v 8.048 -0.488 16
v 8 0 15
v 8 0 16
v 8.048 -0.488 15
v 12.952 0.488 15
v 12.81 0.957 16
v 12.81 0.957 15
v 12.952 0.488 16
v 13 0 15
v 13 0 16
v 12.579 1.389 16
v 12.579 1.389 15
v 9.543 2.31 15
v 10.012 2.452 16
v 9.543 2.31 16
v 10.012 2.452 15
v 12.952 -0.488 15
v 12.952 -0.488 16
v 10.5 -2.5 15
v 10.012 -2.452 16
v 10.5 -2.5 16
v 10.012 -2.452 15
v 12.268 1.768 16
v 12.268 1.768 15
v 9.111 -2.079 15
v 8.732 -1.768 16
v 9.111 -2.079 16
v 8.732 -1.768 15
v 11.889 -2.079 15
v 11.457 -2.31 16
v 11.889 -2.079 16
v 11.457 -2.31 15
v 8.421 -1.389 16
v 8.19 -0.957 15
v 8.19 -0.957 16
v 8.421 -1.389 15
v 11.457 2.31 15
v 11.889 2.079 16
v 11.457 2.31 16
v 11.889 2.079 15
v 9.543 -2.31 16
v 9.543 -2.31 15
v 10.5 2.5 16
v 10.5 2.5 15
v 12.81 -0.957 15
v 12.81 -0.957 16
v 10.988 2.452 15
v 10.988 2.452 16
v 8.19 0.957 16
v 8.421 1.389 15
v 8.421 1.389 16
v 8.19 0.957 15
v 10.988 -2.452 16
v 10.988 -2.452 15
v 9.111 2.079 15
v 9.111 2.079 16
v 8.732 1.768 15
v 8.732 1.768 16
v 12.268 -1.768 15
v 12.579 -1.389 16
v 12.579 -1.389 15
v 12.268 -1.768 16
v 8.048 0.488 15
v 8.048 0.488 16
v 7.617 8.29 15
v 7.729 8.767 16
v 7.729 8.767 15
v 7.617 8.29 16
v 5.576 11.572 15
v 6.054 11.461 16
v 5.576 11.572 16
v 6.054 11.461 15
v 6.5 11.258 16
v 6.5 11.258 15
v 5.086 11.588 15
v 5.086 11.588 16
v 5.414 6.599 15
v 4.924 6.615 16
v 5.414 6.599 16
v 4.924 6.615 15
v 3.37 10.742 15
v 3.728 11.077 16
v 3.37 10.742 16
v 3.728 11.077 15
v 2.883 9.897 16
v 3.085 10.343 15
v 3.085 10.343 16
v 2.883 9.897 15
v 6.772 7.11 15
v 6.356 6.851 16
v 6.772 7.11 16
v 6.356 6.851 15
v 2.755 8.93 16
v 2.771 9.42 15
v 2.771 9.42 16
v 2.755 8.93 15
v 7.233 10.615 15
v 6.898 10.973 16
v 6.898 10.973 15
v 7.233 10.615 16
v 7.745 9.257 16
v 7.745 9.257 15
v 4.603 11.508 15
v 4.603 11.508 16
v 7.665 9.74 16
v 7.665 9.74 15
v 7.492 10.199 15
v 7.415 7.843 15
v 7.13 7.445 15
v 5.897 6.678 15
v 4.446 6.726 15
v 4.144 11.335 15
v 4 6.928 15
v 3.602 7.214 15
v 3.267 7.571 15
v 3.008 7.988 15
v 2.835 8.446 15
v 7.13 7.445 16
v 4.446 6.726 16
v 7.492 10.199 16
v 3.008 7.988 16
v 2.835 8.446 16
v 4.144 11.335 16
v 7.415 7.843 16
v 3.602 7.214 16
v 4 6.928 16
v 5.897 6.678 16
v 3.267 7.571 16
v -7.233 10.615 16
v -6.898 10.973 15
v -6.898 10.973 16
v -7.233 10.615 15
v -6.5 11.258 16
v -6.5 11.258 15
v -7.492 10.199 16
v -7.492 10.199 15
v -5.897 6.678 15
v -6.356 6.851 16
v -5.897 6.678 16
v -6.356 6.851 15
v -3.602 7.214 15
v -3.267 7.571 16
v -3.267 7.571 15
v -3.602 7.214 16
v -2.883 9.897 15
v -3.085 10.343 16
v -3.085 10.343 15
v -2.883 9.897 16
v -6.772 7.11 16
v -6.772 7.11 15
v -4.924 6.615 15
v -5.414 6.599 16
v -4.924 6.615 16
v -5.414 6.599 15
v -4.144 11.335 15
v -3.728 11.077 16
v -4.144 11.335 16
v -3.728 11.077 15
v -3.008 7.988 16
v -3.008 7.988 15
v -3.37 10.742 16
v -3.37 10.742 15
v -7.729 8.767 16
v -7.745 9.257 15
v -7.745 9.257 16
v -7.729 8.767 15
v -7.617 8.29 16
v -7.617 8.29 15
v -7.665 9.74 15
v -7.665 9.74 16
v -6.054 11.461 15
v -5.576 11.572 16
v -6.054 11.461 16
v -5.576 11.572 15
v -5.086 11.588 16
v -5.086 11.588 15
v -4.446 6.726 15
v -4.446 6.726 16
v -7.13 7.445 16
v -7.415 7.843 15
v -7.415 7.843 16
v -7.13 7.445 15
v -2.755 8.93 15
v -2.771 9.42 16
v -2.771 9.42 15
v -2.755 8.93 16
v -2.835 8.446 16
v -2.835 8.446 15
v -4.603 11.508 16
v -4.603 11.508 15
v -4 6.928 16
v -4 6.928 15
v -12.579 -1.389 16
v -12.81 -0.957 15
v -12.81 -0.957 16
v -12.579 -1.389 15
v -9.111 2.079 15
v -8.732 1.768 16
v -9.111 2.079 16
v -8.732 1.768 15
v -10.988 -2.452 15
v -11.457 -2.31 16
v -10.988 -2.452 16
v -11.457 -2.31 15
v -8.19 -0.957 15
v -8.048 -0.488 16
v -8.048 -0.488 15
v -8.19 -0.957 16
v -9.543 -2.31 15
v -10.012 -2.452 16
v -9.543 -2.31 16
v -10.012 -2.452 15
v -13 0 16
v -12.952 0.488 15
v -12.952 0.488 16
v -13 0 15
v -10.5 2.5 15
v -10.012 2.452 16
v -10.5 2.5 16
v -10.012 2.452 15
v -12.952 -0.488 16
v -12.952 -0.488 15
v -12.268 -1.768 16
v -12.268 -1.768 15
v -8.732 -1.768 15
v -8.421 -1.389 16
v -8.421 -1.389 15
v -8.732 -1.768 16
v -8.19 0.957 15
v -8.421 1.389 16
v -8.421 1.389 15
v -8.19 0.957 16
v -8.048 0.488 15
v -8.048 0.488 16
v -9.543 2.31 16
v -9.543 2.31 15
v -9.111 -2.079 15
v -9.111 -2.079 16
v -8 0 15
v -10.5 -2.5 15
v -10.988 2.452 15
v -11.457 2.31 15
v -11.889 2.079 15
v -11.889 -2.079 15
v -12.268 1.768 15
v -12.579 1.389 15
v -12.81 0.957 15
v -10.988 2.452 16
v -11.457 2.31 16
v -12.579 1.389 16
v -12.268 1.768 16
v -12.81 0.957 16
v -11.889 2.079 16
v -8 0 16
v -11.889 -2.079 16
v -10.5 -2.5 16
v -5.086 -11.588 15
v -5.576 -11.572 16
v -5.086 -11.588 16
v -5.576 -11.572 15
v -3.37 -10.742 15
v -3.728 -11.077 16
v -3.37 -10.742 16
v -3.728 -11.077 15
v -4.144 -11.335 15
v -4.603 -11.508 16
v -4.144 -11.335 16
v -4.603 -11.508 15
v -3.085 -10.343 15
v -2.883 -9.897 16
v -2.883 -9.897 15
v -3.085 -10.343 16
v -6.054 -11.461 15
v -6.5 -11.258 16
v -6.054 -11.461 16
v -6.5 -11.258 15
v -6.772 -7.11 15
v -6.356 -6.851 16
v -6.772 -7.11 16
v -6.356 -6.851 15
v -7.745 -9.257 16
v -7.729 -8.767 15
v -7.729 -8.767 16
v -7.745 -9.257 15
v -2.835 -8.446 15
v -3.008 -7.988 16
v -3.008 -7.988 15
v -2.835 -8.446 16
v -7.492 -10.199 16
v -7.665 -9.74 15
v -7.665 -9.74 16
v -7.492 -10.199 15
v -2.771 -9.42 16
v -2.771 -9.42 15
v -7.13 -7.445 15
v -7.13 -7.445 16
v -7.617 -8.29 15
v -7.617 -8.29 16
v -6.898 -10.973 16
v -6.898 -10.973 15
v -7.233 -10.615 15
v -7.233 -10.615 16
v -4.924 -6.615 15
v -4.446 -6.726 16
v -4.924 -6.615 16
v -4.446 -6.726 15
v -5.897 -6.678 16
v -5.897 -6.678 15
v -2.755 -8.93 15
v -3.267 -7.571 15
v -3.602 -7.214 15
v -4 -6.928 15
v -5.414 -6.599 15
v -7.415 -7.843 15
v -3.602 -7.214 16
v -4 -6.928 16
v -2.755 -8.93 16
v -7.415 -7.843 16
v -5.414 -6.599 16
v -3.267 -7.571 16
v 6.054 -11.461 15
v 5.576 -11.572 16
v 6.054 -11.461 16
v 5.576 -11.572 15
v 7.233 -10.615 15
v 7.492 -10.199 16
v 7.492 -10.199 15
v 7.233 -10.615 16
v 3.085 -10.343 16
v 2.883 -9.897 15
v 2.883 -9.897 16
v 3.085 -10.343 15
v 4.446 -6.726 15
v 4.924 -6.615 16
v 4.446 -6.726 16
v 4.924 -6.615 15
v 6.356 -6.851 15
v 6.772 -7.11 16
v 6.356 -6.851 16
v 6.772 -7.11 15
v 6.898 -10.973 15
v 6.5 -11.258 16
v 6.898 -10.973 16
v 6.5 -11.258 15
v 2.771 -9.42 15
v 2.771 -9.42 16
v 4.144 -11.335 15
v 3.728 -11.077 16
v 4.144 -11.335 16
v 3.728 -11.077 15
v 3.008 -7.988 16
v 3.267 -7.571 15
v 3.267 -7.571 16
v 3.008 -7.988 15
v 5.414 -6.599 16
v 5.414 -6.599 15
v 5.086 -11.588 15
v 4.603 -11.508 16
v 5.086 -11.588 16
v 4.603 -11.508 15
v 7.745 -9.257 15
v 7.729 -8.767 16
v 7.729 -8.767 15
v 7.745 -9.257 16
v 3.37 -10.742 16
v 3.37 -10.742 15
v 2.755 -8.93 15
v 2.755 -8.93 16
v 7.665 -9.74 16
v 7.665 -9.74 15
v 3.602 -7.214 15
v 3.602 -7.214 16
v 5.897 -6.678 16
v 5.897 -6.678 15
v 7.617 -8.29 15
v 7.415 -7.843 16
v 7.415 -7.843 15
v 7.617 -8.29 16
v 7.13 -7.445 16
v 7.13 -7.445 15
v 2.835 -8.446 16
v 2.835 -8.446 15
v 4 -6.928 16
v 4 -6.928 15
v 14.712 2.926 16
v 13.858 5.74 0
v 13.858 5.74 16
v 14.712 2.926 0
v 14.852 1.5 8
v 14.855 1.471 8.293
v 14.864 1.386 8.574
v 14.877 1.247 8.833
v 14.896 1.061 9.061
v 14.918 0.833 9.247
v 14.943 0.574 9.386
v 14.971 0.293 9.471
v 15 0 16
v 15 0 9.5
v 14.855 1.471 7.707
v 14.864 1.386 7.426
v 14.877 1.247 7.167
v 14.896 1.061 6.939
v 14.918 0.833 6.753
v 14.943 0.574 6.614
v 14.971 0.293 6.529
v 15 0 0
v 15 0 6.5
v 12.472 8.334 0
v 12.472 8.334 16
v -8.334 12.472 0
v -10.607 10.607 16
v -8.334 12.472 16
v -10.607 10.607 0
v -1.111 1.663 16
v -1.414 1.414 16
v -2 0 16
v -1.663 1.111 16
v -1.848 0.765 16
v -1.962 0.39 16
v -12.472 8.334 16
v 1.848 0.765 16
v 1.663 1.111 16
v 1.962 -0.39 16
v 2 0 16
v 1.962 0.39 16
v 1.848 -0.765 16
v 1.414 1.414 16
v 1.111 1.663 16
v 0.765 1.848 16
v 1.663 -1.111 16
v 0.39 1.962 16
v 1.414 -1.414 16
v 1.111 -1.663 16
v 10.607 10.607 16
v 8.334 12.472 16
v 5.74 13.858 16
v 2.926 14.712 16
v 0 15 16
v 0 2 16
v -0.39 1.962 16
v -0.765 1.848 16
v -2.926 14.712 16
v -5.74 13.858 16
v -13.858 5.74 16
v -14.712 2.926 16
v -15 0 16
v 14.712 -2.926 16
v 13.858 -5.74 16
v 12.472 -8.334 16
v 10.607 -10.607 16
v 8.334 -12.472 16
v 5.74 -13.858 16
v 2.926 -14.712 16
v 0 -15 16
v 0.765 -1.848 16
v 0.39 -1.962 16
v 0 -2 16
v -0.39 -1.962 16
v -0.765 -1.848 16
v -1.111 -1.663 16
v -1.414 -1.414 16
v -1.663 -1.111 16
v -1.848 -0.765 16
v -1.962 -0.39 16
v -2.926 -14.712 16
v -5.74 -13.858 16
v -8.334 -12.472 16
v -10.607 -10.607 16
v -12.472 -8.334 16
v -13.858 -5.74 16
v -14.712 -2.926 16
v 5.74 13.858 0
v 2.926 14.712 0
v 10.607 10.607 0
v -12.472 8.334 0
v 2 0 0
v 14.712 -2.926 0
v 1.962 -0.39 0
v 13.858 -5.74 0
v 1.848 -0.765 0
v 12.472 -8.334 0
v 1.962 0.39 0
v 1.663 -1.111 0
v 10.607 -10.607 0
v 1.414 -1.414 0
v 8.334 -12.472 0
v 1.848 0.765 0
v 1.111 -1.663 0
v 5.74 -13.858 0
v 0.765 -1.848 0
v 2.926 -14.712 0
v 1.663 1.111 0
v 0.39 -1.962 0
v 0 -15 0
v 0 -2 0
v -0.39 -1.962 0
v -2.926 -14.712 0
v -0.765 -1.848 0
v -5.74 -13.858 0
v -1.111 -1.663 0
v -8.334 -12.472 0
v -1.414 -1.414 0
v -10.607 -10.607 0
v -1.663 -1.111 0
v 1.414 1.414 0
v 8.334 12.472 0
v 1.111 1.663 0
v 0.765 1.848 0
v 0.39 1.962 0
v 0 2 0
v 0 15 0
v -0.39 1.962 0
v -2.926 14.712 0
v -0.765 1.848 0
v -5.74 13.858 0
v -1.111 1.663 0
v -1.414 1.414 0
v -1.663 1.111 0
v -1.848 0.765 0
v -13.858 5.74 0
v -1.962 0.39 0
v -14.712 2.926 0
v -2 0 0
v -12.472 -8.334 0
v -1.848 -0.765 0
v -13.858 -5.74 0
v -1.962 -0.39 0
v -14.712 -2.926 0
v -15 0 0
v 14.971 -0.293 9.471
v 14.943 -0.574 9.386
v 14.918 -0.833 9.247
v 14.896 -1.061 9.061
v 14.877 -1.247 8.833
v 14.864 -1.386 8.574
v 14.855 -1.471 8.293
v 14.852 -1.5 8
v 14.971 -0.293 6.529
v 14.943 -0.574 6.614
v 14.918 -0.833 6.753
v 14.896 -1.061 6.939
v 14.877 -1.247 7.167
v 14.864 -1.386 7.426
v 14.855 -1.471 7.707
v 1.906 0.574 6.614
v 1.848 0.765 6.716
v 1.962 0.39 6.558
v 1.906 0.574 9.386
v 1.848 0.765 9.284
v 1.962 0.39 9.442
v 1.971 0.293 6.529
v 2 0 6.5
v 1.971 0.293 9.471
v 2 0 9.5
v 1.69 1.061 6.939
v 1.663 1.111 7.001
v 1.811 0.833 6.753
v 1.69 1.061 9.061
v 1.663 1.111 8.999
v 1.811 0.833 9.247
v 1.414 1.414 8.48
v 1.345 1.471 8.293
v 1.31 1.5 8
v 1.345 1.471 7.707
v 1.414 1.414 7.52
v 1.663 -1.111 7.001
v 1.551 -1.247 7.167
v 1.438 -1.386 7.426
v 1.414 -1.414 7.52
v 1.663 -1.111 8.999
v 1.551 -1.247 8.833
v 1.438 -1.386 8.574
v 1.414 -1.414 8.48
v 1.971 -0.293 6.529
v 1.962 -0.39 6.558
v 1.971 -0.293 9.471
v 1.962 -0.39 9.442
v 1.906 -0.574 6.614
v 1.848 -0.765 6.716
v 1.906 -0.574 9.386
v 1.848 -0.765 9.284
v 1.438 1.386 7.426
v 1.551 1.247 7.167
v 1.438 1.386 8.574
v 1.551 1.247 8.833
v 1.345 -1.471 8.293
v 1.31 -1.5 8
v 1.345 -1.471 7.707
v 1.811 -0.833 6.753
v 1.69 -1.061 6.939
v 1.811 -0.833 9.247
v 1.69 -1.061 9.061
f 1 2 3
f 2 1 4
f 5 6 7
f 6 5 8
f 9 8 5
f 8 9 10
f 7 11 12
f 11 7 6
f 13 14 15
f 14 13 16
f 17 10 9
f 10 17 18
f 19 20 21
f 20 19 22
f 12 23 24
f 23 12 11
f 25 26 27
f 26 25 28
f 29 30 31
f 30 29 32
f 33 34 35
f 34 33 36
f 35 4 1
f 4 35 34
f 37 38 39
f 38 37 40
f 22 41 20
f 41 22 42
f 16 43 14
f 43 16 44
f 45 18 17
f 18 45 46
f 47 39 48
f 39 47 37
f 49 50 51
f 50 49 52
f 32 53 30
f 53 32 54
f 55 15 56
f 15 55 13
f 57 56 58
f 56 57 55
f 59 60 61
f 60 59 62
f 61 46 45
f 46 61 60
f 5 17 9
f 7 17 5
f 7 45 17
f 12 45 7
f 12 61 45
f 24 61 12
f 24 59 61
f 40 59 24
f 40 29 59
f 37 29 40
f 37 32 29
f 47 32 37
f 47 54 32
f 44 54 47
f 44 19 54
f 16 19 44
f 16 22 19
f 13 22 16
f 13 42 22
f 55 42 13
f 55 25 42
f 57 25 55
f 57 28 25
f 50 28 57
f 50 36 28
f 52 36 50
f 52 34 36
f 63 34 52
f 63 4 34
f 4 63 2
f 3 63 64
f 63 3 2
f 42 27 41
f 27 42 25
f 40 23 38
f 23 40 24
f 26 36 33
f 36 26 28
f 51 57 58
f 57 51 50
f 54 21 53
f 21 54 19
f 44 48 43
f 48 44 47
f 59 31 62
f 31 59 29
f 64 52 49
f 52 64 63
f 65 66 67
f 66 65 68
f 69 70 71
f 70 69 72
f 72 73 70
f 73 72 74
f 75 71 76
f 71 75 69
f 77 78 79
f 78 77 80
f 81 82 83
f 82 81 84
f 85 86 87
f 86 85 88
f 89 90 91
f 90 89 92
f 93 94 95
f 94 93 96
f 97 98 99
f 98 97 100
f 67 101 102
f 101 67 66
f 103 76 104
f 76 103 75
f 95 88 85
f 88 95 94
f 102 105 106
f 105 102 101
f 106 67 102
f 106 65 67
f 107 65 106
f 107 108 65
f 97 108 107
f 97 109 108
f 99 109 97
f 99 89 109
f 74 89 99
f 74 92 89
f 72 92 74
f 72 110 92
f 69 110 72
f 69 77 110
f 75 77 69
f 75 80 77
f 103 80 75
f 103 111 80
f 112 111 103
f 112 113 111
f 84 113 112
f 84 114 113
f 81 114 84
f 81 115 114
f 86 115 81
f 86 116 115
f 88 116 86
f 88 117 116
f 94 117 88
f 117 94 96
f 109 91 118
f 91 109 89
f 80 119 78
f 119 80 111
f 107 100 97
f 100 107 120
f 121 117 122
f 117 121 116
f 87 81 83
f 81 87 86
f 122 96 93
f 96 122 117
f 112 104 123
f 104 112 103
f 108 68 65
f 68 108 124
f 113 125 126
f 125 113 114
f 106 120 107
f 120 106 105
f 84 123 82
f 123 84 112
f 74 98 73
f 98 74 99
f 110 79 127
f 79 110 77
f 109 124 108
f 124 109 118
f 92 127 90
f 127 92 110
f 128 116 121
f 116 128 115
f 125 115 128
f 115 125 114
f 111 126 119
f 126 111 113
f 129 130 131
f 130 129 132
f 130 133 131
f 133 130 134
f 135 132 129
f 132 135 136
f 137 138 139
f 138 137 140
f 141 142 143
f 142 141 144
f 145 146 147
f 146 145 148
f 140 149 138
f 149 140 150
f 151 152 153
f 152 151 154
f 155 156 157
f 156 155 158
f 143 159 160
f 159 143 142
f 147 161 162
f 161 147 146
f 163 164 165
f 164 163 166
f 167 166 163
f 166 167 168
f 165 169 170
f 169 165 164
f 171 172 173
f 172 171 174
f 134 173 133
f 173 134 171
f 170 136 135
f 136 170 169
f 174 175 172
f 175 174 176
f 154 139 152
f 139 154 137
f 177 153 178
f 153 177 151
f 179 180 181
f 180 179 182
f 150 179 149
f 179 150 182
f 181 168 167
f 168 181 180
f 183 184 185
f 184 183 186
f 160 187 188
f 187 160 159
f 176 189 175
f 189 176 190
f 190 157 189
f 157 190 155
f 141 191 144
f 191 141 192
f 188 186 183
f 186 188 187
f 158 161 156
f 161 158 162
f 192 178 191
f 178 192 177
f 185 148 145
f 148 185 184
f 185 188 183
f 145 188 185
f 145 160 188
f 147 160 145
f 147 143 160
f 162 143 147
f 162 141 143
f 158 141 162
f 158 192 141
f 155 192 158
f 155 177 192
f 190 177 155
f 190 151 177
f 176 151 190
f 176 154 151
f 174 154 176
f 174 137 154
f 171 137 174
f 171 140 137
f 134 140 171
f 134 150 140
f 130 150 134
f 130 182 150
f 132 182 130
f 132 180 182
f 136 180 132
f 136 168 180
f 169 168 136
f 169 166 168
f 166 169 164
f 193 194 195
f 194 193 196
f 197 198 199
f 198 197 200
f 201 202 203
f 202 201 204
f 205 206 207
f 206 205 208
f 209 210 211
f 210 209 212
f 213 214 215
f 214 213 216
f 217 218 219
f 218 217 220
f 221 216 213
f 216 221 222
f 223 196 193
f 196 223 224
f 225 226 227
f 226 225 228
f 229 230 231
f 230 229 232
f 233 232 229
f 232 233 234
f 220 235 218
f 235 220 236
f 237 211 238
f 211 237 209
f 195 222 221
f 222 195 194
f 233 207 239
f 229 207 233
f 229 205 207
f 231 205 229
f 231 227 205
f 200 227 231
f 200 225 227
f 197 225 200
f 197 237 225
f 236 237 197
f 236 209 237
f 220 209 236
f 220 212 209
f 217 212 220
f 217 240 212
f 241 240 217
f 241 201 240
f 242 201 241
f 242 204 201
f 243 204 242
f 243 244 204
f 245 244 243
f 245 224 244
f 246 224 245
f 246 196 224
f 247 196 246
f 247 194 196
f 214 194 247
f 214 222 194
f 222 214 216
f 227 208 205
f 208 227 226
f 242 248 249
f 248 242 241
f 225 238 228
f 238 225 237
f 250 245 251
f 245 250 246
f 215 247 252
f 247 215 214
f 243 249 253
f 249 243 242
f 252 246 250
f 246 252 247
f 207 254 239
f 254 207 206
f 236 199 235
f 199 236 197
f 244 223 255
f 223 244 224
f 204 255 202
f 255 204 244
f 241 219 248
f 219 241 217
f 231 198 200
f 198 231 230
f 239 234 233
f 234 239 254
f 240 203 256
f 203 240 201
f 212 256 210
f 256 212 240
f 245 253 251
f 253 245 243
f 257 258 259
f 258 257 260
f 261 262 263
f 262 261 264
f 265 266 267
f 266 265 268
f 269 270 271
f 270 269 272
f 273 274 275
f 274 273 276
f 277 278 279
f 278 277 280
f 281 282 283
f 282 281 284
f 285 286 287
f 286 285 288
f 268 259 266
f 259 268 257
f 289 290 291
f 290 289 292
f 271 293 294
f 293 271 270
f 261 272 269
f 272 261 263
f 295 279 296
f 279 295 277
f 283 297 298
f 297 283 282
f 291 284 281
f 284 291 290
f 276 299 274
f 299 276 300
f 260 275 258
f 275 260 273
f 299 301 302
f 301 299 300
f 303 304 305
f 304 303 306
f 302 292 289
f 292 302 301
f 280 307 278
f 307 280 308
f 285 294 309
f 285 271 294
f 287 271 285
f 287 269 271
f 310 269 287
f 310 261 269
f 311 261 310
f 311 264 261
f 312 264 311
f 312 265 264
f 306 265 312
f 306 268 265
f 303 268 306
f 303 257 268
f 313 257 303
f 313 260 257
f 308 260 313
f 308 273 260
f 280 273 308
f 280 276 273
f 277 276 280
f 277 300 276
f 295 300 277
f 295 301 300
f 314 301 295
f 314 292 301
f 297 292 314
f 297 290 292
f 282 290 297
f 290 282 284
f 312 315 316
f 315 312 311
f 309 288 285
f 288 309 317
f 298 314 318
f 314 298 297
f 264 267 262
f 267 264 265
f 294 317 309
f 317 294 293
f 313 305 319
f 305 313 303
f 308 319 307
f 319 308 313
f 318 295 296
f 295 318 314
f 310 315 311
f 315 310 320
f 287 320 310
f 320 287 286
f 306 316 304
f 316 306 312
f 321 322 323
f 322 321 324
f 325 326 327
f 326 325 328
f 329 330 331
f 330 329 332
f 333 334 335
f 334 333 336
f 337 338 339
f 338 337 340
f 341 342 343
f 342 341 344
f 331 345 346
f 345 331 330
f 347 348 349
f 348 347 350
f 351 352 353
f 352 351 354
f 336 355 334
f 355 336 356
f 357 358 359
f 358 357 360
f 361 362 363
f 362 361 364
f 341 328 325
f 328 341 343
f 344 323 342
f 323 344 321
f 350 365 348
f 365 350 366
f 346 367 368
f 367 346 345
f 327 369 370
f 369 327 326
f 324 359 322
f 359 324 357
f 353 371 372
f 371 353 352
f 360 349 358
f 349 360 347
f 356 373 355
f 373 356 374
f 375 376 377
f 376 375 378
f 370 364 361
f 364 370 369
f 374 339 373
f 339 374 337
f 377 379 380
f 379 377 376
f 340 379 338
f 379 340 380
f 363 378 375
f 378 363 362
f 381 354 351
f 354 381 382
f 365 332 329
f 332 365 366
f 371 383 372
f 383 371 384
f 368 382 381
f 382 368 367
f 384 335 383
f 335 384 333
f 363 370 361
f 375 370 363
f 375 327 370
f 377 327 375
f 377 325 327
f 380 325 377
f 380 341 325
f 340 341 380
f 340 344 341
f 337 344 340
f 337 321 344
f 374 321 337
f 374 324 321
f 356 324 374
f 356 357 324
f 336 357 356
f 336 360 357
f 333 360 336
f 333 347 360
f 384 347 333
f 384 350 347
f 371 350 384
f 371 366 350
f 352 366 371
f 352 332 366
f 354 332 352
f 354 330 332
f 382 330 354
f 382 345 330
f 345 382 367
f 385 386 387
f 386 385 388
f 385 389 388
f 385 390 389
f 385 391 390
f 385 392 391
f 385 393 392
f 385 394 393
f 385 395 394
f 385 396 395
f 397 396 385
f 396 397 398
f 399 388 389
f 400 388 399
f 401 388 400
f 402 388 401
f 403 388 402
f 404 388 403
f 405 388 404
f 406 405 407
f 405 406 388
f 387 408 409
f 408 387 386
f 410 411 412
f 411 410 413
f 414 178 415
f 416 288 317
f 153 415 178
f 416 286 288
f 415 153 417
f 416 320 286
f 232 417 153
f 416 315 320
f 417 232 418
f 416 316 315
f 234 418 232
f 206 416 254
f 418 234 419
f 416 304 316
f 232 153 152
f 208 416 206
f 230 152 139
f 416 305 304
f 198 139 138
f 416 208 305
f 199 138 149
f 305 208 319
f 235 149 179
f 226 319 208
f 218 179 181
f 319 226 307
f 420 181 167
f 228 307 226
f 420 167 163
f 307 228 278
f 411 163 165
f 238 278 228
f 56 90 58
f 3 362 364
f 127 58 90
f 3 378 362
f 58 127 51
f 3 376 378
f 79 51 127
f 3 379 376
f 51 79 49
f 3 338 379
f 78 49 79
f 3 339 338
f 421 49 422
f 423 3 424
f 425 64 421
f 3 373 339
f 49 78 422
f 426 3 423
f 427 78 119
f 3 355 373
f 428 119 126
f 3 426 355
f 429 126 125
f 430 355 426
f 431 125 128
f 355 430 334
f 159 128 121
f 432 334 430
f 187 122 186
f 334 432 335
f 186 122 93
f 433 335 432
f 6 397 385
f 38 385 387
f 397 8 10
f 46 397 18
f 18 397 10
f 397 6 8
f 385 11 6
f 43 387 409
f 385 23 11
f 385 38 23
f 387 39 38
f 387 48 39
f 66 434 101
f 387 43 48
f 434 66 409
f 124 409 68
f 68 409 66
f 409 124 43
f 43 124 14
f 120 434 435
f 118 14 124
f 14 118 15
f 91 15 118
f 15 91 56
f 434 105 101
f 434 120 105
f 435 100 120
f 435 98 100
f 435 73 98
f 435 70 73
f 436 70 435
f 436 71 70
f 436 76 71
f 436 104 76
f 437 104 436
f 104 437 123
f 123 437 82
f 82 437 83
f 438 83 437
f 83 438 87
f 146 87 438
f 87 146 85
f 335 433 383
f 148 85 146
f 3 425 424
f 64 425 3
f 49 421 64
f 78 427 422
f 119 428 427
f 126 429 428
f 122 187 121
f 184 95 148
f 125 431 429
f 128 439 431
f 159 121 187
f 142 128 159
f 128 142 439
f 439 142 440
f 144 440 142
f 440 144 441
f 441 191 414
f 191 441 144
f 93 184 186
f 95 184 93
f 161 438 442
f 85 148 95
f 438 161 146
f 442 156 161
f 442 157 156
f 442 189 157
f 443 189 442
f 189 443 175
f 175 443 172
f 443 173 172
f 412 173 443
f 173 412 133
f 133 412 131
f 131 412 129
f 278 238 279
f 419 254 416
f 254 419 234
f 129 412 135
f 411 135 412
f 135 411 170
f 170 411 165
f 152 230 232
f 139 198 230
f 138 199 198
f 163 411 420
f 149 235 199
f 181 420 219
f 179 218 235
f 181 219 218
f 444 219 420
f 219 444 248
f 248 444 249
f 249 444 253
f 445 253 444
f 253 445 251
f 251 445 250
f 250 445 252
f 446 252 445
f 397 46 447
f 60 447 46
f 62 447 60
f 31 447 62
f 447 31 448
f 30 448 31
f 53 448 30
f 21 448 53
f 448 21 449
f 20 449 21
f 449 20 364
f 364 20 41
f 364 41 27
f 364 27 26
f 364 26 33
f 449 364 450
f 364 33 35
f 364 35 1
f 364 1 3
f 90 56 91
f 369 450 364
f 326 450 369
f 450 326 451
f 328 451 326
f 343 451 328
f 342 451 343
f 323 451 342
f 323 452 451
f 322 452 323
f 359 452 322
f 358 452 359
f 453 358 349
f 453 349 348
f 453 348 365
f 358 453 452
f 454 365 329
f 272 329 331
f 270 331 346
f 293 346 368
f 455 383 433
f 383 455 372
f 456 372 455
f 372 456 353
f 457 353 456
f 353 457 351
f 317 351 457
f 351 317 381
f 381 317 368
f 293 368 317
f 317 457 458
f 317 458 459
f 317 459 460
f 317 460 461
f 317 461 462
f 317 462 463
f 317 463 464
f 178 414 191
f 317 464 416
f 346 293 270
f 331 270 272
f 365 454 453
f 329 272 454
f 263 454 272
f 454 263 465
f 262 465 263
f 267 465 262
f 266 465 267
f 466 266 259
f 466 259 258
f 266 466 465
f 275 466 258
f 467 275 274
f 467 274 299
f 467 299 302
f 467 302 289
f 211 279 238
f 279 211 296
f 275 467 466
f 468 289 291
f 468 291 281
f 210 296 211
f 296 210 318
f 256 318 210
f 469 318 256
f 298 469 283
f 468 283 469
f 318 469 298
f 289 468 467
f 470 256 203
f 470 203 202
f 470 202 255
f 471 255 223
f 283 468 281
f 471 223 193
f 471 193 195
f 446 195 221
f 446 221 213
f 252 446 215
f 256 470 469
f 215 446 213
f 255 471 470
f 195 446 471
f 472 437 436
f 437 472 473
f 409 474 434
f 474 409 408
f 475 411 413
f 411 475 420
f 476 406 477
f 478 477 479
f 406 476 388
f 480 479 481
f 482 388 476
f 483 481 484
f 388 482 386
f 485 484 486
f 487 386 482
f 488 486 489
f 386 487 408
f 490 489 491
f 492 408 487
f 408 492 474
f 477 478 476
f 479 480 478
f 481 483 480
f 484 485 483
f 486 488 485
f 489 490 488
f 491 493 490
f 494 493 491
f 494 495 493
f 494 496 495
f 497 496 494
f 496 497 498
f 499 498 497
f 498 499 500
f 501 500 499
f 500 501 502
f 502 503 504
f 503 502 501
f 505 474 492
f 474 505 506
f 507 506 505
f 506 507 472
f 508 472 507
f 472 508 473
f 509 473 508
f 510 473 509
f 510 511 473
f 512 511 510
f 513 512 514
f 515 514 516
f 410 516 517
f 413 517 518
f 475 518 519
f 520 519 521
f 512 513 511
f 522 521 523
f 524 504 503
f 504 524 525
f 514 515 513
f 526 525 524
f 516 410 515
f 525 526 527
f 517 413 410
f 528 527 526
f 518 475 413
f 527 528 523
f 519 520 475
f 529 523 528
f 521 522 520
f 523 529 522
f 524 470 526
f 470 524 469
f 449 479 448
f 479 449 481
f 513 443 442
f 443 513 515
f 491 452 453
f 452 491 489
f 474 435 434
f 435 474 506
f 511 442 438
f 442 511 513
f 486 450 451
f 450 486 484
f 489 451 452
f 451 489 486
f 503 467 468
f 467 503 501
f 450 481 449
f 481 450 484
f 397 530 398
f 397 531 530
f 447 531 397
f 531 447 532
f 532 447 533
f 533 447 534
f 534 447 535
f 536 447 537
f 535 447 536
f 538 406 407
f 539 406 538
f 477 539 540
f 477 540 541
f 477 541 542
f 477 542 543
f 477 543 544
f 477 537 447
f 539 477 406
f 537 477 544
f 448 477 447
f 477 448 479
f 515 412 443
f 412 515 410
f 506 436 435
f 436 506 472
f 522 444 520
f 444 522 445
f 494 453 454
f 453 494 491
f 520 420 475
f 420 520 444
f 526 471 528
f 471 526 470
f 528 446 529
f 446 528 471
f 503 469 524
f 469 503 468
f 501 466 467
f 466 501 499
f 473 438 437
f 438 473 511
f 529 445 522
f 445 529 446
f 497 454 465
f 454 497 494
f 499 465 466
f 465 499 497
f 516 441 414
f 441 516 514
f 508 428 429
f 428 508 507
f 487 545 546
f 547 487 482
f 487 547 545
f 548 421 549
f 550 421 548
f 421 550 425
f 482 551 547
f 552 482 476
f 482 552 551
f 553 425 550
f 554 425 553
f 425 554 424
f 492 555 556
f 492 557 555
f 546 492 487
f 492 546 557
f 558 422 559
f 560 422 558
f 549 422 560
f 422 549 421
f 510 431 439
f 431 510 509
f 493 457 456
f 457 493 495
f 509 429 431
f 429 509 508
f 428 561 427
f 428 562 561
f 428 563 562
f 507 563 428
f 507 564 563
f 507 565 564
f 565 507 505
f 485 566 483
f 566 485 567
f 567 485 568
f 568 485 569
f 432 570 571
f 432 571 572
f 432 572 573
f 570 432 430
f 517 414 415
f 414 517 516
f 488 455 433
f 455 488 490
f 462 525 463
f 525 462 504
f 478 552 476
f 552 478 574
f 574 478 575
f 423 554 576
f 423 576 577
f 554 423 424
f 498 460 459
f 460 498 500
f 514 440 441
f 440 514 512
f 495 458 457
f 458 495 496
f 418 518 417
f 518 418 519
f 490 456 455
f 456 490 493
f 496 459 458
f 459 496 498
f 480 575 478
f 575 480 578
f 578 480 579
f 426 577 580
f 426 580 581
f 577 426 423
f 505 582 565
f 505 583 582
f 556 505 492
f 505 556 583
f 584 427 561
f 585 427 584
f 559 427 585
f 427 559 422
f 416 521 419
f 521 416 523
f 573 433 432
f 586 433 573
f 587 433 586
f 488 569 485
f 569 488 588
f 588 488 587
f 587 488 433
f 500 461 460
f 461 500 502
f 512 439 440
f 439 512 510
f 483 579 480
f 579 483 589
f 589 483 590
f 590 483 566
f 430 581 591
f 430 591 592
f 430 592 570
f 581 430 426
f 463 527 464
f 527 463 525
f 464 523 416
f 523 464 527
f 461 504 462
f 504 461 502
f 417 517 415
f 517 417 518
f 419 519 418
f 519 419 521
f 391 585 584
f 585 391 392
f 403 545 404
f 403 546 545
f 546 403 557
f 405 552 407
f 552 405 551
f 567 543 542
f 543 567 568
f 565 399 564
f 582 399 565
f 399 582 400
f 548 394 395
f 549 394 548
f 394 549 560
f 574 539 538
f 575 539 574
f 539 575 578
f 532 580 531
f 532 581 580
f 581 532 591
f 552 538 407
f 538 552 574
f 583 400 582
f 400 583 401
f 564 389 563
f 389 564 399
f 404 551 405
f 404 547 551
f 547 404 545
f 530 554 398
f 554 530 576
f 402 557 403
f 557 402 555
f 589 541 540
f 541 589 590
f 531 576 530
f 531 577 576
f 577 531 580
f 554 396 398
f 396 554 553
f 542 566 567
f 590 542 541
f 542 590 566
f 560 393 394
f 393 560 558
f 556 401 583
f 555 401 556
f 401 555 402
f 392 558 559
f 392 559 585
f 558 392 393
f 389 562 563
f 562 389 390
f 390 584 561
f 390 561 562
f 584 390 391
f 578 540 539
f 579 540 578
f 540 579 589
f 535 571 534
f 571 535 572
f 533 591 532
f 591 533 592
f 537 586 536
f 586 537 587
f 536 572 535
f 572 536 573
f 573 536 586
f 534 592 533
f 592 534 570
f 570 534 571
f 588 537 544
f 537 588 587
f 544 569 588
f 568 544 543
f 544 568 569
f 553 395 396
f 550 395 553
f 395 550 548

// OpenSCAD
$fn = 32;

// ----------------------------------------------------------------------
// Control knob: dimpled knob
// ----------------------------------------------------------------------

// --- parameters (mm) ---
dimp_d = 5;               // finger dimple diameter
n_dimp = 6;               // number of dimples
dimp_r = 10.5;            // dimple ring radius
knob_d = 30;              // knob body diameter
knob_h = 16;              // knob body height
bore_d = 4;               // shaft bore diameter
set_d = 3;                // set screw bore diameter
fit_tol = 0.05;           // tolerance for press fits, mm
free_tol = 0.2;           // tolerance for clearance fits, mm

dimp_step = 360 / n_dimp;  // dimple angular step

difference() {
  cylinder(h = knob_h, d = knob_d);
  translate([0, 0, -1]) cylinder(h = knob_h + 2, d = bore_d);
  translate([-1, 0, knob_h / 2]) rotate([0, 90, 0])
    cylinder(h = knob_d / 2 + bore_d / 2 + 2, d = set_d);  for (i = [0 : n_dimp - 1])
    rotate([0, 0, i * dimp_step])
      translate([dimp_r, 0, knob_h - 1])
        cylinder(h = 2, d = dimp_d);
}
